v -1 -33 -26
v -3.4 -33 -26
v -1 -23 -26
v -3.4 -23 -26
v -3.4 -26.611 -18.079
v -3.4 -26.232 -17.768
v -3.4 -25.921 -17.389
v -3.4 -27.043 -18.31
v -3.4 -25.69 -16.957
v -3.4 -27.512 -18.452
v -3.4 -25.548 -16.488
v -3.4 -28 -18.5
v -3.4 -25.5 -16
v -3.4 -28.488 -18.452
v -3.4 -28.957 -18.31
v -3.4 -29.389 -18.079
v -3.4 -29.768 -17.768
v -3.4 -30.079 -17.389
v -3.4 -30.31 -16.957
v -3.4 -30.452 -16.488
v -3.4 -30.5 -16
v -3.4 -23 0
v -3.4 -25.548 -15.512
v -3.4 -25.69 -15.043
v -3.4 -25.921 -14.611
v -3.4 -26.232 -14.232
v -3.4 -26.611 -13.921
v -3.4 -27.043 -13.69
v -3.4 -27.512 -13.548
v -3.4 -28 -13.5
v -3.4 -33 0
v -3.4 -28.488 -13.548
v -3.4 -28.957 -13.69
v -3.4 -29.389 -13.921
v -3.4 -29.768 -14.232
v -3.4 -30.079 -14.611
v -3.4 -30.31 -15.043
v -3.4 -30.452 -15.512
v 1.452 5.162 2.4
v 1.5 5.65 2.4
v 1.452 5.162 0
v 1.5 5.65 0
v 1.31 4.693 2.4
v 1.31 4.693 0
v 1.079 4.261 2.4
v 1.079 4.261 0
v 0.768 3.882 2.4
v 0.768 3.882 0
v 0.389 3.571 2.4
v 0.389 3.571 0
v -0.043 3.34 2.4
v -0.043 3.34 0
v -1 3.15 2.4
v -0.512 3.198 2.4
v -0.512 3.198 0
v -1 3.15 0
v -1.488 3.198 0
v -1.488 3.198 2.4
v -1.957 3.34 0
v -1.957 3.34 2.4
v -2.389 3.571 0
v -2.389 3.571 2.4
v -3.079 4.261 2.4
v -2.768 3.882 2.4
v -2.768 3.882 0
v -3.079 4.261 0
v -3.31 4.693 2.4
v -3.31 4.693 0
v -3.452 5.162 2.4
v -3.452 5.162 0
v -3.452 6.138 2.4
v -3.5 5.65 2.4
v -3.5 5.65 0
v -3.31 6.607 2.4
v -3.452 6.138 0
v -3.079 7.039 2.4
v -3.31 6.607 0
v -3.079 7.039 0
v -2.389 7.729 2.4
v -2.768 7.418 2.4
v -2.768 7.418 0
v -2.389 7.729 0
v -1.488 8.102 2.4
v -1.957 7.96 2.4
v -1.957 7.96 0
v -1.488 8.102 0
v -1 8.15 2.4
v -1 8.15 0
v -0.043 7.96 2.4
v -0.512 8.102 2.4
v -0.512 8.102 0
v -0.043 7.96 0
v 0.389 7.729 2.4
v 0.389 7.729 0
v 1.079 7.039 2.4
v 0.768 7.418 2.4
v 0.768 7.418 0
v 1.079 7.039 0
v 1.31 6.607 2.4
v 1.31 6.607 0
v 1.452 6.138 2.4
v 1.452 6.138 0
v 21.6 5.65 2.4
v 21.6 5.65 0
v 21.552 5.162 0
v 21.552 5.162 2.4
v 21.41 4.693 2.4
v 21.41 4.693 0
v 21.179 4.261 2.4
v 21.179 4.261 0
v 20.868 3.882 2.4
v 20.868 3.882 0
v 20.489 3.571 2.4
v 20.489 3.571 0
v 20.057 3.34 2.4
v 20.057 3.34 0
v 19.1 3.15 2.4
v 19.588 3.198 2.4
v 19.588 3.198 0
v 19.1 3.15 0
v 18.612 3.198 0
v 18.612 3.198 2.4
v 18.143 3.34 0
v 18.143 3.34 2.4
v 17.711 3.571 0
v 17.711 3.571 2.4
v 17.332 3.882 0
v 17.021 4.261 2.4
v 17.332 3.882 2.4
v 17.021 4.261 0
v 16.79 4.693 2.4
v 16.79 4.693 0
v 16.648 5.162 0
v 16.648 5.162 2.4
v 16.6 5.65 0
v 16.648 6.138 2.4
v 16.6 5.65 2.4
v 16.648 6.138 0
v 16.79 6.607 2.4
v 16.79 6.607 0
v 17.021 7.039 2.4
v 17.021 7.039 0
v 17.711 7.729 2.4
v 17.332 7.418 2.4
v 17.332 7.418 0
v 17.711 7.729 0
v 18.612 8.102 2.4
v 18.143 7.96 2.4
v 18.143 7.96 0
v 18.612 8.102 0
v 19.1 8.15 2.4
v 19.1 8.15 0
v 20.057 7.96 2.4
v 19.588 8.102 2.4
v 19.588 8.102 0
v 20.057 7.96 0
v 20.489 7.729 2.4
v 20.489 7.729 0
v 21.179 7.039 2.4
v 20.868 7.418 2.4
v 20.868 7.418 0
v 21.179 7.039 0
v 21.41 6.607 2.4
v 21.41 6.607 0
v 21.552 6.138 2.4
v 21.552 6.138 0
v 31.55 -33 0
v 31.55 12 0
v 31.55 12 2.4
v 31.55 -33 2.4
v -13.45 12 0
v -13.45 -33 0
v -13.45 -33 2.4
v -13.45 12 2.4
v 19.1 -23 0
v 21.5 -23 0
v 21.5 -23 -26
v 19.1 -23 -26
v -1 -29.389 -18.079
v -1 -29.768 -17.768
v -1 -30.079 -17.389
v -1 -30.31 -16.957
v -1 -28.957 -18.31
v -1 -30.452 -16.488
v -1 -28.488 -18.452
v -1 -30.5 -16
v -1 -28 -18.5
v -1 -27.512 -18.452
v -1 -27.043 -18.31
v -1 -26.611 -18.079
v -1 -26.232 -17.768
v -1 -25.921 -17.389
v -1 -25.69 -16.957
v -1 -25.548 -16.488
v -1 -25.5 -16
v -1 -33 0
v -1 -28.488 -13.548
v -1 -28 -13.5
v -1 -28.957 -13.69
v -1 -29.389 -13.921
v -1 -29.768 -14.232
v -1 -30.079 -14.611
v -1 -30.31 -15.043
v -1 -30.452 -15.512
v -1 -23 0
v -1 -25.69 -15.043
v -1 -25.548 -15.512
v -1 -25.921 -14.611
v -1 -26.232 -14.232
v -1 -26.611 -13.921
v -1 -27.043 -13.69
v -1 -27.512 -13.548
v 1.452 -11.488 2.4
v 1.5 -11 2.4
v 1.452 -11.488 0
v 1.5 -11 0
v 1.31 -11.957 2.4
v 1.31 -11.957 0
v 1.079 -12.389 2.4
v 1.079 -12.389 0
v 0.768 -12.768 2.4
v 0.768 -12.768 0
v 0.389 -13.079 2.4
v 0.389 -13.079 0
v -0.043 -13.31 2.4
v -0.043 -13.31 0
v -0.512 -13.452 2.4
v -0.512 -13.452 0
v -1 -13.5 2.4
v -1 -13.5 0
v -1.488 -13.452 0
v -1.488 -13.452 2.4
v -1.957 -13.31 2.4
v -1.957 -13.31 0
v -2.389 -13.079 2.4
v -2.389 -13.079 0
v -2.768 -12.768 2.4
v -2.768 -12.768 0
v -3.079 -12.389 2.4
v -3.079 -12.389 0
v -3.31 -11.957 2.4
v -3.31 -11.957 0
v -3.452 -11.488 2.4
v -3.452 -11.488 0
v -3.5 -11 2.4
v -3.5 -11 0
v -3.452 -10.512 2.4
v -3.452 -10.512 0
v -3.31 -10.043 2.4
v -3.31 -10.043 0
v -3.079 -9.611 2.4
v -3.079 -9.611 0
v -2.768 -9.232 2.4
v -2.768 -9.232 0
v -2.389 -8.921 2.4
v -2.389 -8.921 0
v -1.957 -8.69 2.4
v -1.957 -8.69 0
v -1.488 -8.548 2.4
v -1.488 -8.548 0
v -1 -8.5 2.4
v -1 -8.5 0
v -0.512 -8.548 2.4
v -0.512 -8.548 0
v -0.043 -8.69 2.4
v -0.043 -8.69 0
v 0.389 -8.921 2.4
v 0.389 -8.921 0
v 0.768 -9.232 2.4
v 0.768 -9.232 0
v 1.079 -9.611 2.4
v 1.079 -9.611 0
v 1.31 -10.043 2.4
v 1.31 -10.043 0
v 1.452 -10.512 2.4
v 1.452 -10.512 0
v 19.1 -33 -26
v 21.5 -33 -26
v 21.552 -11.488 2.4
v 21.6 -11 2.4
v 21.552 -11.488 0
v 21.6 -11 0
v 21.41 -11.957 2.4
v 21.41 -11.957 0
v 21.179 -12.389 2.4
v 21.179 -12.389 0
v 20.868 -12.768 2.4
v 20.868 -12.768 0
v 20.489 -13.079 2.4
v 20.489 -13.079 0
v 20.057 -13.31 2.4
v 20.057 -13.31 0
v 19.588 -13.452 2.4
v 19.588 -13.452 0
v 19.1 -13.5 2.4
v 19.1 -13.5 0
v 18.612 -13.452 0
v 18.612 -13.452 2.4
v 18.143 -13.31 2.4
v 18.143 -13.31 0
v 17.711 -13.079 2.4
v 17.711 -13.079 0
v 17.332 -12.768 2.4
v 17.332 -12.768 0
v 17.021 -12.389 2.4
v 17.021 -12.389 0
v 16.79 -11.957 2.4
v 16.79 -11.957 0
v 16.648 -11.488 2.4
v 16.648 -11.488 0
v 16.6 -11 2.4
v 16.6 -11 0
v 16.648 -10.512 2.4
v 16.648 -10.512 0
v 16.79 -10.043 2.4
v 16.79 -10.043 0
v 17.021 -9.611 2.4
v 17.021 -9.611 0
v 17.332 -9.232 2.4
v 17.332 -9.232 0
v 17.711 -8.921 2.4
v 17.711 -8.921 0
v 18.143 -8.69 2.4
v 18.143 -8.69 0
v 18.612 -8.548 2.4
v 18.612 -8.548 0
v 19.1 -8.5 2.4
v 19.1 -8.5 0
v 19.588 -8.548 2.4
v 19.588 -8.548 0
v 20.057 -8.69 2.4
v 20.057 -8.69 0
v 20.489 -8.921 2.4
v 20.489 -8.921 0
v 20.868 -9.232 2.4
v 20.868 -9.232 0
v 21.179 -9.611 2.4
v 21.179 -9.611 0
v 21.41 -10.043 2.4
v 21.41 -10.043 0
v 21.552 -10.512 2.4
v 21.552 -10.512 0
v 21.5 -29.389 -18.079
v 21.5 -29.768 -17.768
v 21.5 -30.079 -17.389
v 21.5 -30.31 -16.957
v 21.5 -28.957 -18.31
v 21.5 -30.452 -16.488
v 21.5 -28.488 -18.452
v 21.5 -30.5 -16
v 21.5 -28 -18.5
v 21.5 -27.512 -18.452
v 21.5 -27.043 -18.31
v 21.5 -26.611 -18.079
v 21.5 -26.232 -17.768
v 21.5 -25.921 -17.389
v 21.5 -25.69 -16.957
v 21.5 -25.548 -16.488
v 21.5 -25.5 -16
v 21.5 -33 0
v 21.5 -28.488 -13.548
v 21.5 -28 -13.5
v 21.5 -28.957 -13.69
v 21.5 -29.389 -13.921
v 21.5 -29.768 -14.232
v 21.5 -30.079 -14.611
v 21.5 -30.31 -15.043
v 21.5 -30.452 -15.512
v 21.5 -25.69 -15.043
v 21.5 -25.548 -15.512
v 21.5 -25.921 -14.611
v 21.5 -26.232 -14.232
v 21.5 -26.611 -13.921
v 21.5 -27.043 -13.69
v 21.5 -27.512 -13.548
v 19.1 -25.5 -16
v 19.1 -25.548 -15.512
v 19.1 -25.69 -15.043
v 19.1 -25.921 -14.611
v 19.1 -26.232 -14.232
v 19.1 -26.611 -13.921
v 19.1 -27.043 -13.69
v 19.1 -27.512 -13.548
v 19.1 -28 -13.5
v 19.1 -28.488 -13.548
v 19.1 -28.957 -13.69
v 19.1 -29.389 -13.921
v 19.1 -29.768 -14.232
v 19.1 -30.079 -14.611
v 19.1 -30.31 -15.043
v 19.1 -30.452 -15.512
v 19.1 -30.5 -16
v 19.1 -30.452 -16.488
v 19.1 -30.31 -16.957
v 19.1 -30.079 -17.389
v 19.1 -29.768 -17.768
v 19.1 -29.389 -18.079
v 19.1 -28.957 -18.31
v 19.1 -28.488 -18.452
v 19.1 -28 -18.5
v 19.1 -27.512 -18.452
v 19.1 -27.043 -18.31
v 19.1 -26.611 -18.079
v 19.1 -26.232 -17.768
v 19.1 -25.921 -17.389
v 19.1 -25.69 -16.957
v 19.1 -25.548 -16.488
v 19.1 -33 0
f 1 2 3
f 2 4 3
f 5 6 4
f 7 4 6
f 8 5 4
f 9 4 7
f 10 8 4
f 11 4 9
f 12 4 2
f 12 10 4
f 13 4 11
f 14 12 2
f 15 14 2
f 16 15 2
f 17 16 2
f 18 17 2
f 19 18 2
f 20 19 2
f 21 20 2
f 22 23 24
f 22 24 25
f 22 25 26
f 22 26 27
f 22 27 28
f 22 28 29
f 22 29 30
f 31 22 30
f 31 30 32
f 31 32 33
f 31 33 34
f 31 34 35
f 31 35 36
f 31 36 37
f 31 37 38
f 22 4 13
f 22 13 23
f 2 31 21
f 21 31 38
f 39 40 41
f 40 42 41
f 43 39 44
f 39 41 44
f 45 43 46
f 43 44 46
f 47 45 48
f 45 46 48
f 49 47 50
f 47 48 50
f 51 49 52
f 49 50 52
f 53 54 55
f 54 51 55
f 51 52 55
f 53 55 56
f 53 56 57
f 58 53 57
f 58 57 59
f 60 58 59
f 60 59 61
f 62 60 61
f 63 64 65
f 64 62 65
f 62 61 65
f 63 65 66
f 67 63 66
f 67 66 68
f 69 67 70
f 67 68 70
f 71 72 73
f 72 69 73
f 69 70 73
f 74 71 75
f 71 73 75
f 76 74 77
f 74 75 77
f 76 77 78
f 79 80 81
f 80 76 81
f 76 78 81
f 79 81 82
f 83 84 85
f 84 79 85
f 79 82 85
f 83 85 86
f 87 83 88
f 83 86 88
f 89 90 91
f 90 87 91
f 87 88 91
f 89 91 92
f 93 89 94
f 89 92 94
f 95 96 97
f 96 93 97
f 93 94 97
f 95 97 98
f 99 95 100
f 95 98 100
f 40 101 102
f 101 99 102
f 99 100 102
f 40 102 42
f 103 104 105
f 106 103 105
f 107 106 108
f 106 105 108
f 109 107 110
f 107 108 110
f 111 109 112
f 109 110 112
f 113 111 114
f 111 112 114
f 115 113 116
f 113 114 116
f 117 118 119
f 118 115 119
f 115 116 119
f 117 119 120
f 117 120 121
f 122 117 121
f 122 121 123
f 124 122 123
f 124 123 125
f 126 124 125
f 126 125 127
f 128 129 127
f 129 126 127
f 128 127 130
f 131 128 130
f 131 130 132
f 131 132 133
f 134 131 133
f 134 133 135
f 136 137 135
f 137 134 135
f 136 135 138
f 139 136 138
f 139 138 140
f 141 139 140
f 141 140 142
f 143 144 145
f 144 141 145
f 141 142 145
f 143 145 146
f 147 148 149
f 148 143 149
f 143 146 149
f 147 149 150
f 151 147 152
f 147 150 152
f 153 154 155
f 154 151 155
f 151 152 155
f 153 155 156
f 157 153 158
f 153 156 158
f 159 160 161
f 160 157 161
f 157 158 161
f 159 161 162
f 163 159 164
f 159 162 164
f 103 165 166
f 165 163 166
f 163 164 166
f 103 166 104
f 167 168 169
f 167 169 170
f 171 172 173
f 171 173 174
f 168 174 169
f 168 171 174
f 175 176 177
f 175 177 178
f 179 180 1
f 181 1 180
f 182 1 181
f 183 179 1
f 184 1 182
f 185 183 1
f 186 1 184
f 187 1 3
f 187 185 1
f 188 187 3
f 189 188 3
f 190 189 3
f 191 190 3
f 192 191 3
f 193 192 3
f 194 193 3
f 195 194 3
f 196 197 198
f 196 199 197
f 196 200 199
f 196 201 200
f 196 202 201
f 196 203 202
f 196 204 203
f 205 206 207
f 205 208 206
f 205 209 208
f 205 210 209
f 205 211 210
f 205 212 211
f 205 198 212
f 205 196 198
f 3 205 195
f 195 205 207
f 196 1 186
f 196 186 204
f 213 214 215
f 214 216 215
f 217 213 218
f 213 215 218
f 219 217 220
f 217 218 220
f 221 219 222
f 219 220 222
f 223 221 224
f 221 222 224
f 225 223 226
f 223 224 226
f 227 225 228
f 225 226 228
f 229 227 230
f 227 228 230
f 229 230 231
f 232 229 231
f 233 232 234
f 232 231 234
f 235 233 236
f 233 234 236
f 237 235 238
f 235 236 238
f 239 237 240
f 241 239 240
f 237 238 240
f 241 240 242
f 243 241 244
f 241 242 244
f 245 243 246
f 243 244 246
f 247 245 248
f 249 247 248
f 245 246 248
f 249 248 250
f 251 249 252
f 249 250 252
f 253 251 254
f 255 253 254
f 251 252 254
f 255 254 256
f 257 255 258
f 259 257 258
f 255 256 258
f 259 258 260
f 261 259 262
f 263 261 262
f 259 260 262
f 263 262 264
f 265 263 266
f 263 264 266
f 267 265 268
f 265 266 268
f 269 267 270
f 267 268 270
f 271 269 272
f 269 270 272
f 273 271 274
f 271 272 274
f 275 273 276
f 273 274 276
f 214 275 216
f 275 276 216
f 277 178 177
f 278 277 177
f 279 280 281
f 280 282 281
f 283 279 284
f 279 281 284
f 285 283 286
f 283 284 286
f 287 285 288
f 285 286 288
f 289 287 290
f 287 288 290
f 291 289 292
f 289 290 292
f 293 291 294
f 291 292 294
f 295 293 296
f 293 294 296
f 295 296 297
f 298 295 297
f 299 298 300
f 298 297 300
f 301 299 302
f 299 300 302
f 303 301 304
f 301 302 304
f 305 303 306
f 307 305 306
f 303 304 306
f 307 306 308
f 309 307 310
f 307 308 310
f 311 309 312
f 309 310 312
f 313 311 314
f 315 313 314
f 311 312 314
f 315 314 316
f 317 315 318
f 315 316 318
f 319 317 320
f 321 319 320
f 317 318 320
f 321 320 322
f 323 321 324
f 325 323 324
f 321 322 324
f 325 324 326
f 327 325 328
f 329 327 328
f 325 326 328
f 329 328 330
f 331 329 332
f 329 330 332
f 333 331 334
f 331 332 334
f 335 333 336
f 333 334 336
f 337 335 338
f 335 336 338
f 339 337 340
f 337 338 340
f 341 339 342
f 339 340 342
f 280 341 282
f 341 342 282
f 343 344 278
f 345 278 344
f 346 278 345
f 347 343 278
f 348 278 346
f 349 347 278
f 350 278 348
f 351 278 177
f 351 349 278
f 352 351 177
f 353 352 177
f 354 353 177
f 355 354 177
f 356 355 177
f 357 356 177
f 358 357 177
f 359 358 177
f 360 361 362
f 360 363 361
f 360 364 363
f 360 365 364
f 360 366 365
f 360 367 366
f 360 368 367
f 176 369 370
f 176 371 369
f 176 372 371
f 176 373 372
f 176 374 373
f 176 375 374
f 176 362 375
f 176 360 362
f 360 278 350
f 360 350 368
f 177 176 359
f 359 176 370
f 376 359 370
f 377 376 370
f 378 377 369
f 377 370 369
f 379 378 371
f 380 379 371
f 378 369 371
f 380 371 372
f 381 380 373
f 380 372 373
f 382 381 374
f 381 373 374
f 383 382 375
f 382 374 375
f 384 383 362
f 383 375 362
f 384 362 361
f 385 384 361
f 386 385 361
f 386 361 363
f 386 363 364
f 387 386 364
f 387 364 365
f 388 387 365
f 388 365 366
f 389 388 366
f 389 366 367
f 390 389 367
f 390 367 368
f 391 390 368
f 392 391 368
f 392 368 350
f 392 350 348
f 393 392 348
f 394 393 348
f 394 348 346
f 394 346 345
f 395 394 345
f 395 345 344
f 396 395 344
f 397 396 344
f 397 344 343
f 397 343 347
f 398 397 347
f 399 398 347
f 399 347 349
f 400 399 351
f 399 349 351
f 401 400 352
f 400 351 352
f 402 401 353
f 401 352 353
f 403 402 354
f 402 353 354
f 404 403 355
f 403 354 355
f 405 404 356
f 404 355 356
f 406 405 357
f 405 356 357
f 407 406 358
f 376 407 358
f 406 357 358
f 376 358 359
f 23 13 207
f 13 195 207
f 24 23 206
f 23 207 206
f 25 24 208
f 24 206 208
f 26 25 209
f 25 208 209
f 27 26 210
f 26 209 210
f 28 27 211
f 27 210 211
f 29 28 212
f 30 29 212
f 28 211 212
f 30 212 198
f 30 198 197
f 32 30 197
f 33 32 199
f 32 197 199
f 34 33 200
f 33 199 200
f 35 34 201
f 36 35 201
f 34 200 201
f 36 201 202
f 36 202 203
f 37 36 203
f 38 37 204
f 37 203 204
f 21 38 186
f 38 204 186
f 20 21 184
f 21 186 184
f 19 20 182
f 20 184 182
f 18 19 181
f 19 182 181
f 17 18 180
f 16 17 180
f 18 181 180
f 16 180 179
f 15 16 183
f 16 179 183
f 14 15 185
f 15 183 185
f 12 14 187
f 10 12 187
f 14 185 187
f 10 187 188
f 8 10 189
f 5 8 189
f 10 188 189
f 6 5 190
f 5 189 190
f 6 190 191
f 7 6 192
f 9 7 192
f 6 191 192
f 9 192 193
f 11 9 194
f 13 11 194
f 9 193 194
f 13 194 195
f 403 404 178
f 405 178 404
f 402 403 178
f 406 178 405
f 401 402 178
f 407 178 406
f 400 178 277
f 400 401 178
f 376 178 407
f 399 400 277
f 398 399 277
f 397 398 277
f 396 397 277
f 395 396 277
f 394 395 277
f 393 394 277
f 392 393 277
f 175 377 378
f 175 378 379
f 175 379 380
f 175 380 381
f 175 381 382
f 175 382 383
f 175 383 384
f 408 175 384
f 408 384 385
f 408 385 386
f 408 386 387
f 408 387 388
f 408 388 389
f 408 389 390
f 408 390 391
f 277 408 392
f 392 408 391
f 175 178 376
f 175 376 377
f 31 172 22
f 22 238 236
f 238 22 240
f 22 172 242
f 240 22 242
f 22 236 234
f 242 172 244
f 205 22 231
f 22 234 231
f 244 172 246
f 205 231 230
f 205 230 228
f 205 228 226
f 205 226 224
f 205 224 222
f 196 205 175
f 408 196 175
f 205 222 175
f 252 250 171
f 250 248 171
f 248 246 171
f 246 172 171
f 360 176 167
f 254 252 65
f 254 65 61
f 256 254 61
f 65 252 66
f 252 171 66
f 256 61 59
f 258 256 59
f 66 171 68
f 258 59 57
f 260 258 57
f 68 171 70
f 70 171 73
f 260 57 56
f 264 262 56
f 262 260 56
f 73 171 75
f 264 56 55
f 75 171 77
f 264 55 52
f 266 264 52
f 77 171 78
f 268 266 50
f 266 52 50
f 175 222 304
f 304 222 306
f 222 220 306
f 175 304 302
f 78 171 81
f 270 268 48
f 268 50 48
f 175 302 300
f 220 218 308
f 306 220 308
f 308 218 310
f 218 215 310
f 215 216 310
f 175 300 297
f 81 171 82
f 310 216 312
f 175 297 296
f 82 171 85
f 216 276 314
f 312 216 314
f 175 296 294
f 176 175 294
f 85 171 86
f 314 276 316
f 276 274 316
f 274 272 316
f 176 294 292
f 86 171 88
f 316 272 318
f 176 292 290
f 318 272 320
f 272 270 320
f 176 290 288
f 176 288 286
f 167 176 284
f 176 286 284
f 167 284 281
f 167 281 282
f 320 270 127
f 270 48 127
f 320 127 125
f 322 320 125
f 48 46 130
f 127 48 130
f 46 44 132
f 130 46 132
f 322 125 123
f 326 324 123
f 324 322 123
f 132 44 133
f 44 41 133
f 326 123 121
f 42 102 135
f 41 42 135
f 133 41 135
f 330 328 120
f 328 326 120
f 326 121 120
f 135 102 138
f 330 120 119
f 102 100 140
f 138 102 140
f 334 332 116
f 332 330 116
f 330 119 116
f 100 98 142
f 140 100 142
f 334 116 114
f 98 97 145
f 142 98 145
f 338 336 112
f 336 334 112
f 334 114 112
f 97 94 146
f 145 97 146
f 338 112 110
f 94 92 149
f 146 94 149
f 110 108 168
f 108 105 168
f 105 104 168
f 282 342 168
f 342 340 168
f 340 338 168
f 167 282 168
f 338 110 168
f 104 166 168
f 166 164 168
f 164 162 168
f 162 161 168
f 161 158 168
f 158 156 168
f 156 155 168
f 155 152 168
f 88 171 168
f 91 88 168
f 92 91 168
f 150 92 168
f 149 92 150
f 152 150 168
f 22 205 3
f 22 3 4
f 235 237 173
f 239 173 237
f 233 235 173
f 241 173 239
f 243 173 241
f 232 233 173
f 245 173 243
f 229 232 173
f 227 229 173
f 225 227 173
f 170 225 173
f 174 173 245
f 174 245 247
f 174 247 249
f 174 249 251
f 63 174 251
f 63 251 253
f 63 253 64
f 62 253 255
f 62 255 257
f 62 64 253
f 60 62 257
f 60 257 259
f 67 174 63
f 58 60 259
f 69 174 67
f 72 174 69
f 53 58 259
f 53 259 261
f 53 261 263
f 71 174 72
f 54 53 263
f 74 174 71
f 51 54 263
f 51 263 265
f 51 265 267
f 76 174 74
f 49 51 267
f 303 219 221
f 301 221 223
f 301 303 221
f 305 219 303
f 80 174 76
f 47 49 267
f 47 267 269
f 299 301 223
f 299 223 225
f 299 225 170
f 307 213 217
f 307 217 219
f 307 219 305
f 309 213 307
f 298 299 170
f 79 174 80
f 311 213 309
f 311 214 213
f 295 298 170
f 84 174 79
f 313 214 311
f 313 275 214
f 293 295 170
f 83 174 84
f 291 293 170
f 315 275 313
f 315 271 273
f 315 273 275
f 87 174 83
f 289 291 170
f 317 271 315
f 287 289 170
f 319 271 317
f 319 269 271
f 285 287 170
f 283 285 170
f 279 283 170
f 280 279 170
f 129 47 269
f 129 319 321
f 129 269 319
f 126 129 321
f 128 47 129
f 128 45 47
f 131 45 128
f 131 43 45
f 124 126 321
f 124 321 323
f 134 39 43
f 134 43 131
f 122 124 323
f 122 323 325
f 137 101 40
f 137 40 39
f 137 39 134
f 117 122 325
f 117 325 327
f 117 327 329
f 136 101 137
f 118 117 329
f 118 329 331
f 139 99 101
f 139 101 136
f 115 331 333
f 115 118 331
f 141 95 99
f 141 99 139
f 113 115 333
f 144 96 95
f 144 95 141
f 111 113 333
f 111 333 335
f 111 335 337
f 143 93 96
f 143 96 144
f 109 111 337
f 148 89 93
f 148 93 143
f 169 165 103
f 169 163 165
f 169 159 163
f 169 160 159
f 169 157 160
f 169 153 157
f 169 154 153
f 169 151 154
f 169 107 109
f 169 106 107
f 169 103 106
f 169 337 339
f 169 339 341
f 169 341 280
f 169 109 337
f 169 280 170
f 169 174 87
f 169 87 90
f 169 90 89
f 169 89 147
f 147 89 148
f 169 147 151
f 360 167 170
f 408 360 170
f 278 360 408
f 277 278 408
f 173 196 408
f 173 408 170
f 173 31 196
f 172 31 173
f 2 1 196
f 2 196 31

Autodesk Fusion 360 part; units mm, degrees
sketch "Sketch1" plane through (0, 0, 0) normal (0, 0, 1) x (1, 0, 0)
  line L0 (-13.45, 12) -> (31.55, 12)
  line L1 (31.55, 12) -> (31.55, -33)
  line L2 (31.55, -33) -> (-13.45, -33)
  line L3 (-13.45, -33) -> (-13.45, 12)
  line L4 (-3.4, -33) -> (-1, -33)
  line L5 (-1, -33) -> (-1, -23)
  line L6 (-1, -23) -> (-3.4, -23)
  line L7 (-3.4, -23) -> (-3.4, -33)
  line L8 (19.1, -23) -> (19.1, -33)
  line L9 (21.5, -23) -> (19.1, -23)
  line L10 (21.5, -33) -> (21.5, -23)
  line L11 (19.1, -33) -> (21.5, -33)
  circle A0 centre (-1, 5.65) radius 2.5
  circle A1 centre (-1, 5.65) radius 7.65
  circle A2 centre (19.1, 5.65) radius 7.65
  circle A3 centre (19.1, 5.65) radius 2.5
  circle A4 centre (-1, -11) radius 2.5
  circle A5 centre (19.1, -11) radius 2.5
  circle A6 centre (-1, -11) radius 9
  circle A7 centre (19.1, -11) radius 9
  dimension "d1" = 45
  dimension "d2" = 45
  dimension "d3" = 10
  dimension "d4" = 2.4
  dimension "d5" = 10.05
  dimension "d7" = 2.4
  dimension "d8" = 20.1
  dimension "d9" = 5
  dimension "d10" = 6.35
  dimension "d11" = 15.3
  dimension "d13" = 5
  dimension "d14" = 15.3
  dimension "d15" = 20.1
  dimension "d16" = 12.45
  dimension "d25" = 5
  dimension "d26" = 5
  dimension "d27" = 20.1
  dimension "d28" = 12.45
  dimension "d31" = 18
  dimension "d32" = 18
extrude "Extrude1" add sketch "Sketch1" along normal blind 2.4 contours A7 | A6 | L0 L1 L2 L3 L5 L6 L7 L8 L9 L10 A1 A2 | L0 A1 | L2 L4 L5 L6 L7 | L0 A2 | L2 L8 L9 L10 L11 | A4 | A5 picked at (-1.0623, 10.7143) picked at (19.0377, 10.7143)
extrude "Extrude2" add sketch "Sketch1" against normal blind 26 contours L2 L4 L5 L6 L7 | L2 L8 L9 L10 L11
sketch "Sketch2" plane through (21.5, 0, 0) normal (1, 0, 0) x (0, 1, 0)
  line L0 (-23, 0) -> (-33, 0)
  line L1 (-33, 0) -> (-33, -26)
  line L2 (-33, -26) -> (-23, -26)
  line L3 (-23, -26) -> (-23, 0)
  circle A0 centre (-28, -16) radius 2.5
  dimension "d21" = 5
  dimension "d22" = 10
extrude "Extrude3" cut sketch "Sketch2" against normal blind 30 contours A0
extrude "Extrude4" cut sketch "Sketch1" along normal blind 3 contours A4 | A5
